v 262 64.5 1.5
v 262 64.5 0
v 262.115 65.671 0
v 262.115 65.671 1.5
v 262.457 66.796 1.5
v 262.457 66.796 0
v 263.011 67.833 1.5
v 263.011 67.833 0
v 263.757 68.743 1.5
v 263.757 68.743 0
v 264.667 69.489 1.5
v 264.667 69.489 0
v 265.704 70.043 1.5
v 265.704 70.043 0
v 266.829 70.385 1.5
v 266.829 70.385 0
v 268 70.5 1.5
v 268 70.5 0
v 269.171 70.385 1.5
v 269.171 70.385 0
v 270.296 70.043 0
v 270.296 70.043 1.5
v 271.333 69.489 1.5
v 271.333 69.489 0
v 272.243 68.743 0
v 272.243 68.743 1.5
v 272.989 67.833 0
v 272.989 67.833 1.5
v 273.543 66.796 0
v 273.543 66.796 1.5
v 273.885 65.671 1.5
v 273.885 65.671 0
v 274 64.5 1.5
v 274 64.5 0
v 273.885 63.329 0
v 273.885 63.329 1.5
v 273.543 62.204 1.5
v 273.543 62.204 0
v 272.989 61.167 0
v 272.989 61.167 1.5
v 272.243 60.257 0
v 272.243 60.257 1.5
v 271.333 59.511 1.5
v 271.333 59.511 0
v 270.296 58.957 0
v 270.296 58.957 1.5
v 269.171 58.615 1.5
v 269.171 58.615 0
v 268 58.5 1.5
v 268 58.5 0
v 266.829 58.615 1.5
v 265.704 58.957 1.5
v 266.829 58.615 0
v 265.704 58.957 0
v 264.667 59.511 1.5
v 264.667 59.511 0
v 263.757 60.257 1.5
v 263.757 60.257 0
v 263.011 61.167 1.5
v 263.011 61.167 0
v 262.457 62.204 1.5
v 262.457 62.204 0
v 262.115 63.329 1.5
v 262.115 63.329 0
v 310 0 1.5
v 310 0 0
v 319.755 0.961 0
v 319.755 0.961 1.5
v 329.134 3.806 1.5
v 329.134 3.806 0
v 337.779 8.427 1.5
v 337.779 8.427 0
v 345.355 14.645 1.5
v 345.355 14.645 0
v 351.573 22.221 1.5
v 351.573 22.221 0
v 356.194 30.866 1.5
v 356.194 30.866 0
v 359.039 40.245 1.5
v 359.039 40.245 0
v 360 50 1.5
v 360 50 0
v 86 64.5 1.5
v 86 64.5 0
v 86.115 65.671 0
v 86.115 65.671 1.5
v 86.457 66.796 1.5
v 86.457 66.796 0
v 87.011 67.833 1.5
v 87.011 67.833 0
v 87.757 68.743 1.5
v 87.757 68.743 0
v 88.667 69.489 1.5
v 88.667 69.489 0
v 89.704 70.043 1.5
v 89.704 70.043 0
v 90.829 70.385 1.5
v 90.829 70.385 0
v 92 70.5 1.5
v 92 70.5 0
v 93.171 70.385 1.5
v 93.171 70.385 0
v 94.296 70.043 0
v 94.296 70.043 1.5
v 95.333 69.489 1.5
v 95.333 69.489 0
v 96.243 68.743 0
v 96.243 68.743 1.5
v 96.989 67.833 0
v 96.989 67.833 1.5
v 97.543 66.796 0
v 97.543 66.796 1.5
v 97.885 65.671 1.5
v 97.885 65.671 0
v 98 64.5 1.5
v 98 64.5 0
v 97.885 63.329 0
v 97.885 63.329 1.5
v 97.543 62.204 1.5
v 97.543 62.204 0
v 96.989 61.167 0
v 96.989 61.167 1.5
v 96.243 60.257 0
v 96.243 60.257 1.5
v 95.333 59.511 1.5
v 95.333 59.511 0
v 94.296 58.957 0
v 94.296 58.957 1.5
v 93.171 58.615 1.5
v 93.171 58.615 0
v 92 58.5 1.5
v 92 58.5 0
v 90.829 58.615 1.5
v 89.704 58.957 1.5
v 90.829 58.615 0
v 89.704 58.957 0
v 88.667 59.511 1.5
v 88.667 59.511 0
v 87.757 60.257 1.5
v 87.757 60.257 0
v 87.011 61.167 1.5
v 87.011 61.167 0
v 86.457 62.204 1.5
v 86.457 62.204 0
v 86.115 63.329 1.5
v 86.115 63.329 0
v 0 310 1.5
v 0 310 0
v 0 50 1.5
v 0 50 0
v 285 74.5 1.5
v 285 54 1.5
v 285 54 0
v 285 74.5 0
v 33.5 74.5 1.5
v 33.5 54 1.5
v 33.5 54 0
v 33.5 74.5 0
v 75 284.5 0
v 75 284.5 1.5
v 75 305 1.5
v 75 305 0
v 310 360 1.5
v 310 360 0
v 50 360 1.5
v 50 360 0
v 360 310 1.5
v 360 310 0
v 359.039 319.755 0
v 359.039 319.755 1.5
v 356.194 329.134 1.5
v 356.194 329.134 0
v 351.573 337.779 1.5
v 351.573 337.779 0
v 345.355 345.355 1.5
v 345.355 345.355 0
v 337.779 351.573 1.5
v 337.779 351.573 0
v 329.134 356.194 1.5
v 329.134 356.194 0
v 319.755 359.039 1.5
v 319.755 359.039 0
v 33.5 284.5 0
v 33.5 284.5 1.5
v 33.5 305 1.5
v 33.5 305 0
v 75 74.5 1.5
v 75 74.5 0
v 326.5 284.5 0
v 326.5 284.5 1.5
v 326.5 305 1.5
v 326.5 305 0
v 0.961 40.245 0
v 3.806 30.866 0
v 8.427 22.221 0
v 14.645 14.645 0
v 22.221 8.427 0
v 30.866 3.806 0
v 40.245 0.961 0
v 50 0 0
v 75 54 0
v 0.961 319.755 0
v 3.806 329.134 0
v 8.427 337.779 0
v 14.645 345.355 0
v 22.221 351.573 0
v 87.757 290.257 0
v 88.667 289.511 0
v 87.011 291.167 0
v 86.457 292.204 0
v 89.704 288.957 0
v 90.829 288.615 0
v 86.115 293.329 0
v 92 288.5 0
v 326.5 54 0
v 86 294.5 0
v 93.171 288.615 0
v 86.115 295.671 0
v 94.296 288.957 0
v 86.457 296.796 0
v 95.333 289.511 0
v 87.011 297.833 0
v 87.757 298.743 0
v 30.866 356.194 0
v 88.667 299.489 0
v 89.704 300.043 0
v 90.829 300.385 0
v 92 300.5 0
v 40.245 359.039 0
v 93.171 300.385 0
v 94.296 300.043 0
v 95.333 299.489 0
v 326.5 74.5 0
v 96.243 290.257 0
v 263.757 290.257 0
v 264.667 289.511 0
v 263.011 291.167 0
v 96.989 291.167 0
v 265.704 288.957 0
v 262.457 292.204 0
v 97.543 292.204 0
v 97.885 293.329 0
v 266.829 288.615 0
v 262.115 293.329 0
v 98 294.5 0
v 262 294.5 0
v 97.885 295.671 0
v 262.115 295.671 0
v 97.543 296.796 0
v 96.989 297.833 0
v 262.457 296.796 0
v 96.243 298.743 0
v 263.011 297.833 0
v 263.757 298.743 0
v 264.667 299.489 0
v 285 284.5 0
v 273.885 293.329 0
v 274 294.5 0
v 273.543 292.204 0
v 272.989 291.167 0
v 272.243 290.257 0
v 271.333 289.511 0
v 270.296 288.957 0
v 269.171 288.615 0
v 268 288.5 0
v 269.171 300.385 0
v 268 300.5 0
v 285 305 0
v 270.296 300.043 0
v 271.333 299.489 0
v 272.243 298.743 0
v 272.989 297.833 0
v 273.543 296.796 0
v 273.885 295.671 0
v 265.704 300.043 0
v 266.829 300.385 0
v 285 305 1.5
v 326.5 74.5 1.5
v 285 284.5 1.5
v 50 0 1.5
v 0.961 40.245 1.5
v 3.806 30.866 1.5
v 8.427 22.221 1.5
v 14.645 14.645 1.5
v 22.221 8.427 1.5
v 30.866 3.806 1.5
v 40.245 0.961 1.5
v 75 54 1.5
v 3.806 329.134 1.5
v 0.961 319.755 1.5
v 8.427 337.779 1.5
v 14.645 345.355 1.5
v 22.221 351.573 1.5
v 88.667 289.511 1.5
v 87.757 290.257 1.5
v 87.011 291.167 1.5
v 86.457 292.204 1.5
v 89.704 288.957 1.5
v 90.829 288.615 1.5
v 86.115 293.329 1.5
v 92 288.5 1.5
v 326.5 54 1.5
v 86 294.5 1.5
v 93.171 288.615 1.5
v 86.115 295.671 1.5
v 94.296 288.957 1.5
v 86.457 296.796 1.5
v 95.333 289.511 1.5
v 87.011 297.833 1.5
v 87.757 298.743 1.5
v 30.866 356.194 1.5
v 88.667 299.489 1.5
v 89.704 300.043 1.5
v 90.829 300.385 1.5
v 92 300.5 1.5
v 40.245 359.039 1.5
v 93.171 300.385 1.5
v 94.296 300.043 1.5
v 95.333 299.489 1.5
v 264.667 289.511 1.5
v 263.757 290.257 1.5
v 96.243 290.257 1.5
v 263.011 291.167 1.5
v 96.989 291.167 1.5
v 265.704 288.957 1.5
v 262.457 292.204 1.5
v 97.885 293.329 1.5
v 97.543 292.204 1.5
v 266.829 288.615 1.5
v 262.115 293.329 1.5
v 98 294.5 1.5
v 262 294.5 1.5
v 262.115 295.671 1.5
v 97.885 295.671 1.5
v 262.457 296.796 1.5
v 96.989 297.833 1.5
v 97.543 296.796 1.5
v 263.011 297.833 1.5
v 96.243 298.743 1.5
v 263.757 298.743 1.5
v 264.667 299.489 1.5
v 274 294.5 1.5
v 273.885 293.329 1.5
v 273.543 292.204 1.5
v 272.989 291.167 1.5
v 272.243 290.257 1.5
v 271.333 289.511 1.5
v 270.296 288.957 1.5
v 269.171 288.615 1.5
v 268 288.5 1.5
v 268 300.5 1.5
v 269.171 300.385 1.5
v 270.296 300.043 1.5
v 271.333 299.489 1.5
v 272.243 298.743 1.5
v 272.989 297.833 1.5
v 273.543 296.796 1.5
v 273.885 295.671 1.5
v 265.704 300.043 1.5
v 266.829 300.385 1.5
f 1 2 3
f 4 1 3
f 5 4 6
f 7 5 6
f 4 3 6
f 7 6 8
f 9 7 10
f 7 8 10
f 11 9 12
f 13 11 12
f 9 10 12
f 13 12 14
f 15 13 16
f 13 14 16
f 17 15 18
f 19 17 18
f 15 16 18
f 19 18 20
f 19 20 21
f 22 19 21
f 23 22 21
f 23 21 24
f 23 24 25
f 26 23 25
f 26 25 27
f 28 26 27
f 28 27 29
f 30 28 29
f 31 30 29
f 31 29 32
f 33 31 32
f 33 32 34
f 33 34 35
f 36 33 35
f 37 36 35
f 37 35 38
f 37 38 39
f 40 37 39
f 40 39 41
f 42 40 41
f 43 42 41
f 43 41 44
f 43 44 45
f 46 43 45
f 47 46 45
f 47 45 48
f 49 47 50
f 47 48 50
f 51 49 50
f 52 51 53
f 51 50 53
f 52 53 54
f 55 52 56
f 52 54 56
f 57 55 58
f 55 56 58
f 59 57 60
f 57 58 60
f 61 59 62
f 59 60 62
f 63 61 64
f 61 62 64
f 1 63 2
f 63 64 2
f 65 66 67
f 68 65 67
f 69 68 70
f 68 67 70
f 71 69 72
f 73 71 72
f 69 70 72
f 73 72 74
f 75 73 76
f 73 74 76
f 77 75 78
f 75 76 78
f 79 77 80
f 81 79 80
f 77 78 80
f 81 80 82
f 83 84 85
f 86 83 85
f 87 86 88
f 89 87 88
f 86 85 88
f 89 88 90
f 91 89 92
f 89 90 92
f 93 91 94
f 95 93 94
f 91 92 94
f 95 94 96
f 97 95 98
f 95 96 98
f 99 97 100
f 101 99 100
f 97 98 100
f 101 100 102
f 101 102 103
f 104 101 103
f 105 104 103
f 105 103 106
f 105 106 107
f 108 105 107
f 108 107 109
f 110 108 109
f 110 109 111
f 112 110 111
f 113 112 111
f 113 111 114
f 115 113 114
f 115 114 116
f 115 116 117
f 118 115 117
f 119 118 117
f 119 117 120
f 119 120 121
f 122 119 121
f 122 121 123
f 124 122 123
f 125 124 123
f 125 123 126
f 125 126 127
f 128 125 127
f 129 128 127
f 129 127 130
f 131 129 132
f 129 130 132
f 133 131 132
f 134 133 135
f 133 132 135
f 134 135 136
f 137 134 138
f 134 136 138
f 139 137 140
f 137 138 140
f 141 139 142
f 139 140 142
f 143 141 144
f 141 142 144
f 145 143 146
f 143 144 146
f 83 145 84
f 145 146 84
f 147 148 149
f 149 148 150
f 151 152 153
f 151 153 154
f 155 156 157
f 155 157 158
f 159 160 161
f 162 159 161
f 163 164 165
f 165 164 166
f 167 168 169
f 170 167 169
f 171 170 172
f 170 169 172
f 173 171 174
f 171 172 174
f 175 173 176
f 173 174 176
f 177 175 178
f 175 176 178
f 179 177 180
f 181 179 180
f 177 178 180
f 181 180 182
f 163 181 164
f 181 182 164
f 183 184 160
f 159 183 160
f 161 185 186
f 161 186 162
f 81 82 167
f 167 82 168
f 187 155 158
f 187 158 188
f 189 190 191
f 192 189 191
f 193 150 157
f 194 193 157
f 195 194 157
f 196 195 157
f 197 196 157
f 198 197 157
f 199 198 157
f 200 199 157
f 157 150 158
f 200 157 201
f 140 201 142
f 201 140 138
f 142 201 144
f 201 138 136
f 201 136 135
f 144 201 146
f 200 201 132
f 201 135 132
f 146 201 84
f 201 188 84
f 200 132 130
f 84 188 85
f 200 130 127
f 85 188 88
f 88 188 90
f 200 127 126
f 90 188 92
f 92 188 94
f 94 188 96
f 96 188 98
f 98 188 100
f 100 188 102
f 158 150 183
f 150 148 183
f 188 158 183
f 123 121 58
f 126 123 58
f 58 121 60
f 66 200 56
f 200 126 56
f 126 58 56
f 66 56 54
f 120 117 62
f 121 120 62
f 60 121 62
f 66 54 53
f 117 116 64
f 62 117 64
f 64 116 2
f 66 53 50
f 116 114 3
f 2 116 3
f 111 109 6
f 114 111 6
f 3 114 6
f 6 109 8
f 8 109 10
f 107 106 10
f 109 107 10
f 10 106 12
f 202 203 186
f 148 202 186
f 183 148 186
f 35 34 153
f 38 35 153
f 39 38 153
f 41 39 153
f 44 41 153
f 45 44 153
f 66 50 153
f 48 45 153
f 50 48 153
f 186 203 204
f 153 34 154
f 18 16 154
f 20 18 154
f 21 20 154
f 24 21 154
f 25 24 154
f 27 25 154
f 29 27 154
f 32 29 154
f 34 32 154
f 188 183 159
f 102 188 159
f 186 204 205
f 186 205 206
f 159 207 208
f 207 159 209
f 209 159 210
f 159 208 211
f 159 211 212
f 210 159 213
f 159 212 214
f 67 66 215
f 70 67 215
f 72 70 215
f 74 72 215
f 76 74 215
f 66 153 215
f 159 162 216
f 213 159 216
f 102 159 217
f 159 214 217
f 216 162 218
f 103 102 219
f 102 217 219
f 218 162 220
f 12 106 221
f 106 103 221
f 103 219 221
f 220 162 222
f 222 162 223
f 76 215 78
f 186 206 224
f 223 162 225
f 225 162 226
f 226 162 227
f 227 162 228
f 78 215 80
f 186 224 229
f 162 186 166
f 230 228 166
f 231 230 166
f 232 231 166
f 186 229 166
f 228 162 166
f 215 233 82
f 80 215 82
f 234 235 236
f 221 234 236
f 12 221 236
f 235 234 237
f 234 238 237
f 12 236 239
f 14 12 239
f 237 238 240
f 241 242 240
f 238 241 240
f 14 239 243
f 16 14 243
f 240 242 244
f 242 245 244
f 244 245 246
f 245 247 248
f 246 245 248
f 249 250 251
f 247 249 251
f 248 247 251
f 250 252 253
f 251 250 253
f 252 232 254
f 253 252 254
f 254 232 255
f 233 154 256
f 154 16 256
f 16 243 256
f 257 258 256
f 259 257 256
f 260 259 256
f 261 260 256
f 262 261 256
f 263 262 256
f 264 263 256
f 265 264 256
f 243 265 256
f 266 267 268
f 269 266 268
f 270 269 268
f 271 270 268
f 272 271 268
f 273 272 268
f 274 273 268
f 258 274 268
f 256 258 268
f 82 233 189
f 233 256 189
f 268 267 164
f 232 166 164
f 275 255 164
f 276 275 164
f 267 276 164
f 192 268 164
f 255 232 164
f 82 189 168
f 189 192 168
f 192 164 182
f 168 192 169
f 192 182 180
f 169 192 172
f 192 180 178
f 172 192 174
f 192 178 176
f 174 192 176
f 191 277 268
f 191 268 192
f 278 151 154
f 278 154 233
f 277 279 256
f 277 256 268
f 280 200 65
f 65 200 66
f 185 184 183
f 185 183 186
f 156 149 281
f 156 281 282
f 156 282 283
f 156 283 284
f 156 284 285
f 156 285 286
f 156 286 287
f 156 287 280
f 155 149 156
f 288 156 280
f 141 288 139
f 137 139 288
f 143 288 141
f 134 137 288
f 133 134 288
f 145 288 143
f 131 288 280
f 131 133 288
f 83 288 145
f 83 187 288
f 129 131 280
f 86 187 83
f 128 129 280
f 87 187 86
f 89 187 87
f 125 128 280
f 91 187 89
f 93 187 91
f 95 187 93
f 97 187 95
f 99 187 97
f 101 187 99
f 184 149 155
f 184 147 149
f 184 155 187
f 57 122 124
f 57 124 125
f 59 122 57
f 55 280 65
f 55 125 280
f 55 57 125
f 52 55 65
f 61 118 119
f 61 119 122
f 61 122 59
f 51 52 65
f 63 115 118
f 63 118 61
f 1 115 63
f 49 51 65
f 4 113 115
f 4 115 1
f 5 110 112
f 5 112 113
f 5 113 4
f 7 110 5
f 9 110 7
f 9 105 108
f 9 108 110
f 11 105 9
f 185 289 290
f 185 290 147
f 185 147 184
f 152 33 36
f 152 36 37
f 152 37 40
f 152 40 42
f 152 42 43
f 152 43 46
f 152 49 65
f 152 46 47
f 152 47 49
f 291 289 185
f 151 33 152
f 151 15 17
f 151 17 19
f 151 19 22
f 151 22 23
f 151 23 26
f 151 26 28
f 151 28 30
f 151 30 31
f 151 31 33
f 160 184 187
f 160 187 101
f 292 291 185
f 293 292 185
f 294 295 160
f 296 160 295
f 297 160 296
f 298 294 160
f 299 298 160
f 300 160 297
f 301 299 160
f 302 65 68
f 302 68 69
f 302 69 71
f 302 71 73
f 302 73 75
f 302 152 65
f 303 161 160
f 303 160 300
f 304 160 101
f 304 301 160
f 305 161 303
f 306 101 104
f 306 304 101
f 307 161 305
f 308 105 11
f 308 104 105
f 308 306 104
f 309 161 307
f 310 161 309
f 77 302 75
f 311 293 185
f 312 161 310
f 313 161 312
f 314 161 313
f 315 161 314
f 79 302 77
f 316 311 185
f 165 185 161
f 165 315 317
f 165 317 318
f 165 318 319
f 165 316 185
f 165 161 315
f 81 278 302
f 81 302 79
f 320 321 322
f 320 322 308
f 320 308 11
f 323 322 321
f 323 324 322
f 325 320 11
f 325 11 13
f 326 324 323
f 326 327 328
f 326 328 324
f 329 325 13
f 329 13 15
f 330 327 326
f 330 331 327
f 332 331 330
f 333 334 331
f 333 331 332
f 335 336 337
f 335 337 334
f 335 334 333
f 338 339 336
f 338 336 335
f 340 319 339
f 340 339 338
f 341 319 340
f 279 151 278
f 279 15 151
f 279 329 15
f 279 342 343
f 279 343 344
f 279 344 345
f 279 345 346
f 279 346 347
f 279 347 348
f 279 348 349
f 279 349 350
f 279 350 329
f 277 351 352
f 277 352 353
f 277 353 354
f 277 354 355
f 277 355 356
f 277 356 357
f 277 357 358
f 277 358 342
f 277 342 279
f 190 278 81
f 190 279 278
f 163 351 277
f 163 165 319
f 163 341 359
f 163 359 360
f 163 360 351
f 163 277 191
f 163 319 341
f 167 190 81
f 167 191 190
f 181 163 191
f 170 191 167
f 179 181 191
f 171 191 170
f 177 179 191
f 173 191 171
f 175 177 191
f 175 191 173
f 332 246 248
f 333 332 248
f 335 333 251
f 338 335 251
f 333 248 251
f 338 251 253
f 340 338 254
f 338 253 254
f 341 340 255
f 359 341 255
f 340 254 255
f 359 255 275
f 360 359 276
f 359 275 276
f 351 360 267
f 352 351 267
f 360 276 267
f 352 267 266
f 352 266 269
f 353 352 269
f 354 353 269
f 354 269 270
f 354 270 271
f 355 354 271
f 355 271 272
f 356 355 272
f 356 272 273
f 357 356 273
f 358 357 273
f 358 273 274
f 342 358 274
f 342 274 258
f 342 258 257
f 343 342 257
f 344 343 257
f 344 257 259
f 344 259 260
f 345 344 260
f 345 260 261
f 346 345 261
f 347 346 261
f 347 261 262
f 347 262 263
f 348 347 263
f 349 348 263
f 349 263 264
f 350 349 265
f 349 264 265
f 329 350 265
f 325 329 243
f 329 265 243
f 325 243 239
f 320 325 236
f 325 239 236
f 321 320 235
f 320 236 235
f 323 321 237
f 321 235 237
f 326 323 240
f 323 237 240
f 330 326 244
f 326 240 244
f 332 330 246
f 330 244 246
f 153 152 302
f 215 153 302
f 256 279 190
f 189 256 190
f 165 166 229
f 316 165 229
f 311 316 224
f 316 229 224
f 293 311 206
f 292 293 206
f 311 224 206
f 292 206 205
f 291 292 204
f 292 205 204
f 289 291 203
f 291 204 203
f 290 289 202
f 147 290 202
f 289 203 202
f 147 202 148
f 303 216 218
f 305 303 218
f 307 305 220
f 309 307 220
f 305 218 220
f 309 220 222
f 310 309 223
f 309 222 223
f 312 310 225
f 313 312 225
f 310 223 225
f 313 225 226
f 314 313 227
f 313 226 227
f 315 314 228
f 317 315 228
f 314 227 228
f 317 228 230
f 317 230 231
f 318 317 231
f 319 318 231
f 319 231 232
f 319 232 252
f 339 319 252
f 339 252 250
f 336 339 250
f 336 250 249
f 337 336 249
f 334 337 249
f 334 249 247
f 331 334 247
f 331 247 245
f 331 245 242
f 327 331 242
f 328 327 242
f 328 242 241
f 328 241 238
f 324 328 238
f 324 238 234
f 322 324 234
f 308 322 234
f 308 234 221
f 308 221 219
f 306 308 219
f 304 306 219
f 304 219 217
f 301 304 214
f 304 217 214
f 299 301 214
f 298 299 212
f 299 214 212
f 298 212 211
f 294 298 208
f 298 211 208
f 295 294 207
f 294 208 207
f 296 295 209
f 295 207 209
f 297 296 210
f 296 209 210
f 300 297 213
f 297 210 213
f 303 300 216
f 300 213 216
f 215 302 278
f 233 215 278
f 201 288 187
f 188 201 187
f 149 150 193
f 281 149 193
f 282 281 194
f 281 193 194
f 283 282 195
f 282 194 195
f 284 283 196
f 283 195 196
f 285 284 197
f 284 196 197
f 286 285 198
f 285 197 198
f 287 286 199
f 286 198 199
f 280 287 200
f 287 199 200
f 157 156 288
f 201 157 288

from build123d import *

# Parameters (mm, degrees)
BOSS_EXTRUDE1_DEPTH    = 1.5
SKETCH2_W              = 41.5
SKETCH2_H              = 20.5
CUT_EXTRUDE1_DEPTH     = 1.5
F_12_0MM_DOWEL_HOLE1_D = 12


with BuildPart() as part:
    # Sketch1 → Boss-Extrude1 (new body)
    with BuildSketch(Plane.XY):
        with BuildLine():
            Line((50, 0), (310, 0))
            ThreePointArc((310, 0), (345.355339059, 14.644660941), (360, 50))
            Line((360, 50), (360, 310))
            ThreePointArc((360, 310), (345.355339059, 345.355339059), (310, 360))
            Line((310, 360), (50, 360))
            ThreePointArc((50, 360), (14.644660941, 345.355339059), (0, 310))
            Line((0, 310), (0, 50))
            ThreePointArc((0, 50), (14.644660941, 14.644660941), (50, 0))
        make_face()
    extrude(amount=BOSS_EXTRUDE1_DEPTH)

    # Sketch2 → Cut-Extrude1 (cut)
    with BuildSketch(Plane.XY.offset(1.5)):
        with Locations((54.25, 294.75)):
            Rectangle(SKETCH2_W, SKETCH2_H)
        with Locations((305.75, 294.75)):
            Rectangle(SKETCH2_W, SKETCH2_H)
        with Locations((305.75, 64.25)):
            Rectangle(SKETCH2_W, SKETCH2_H)
        with Locations((54.25, 64.25)):
            Rectangle(SKETCH2_W, SKETCH2_H)
    extrude(amount=-CUT_EXTRUDE1_DEPTH, mode=Mode.SUBTRACT)

    # Ø12.0mm Dowel Hole1 (through all)
    with Locations(Plane(origin=(92, 294.5, 1.5), x_dir=(1, 0, 0), z_dir=(0, 0, 1))):
        with Locations((0, 0), (176, 0), (176, -230), (0, -230)):
            Hole(F_12_0MM_DOWEL_HOLE1_D / 2)


solid = part.part
